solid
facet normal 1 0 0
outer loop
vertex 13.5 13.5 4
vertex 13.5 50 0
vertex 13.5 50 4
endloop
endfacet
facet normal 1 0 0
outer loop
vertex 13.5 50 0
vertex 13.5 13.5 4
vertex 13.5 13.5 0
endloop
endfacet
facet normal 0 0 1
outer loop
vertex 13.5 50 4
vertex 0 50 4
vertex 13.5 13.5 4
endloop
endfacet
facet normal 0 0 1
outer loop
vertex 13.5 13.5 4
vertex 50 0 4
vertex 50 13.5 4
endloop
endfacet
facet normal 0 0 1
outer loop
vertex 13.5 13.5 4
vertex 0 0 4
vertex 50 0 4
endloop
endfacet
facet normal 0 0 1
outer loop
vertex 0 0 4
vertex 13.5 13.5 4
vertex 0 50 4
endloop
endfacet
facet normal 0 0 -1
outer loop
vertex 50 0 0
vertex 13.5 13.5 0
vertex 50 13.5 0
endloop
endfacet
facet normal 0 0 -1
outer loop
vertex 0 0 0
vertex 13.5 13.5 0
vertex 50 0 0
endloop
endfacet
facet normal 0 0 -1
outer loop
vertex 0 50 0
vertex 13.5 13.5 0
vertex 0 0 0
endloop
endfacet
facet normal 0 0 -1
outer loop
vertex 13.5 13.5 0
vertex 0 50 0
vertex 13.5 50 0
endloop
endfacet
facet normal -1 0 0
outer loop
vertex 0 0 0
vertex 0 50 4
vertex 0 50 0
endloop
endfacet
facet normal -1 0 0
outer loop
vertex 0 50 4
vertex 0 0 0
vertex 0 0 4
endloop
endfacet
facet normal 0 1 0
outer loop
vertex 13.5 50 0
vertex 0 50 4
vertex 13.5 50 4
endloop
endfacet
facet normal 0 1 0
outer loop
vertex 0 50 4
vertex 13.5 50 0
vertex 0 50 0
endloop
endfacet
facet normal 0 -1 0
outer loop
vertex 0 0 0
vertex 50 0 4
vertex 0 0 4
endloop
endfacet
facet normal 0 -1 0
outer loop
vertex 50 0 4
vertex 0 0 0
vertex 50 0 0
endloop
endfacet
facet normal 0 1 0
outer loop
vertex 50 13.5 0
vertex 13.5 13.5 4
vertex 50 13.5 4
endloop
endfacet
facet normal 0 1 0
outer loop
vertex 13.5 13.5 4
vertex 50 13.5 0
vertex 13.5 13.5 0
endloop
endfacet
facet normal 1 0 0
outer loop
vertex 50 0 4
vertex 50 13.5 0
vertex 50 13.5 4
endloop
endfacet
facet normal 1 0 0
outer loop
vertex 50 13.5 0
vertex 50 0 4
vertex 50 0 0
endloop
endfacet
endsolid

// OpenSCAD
thickness = 4.0;
width = 13.5;
length = 50;

cube([width,length,thickness]);
rotate([0,0,-90])
    translate([-width,0,0])
        cube([width,length,thickness]);
